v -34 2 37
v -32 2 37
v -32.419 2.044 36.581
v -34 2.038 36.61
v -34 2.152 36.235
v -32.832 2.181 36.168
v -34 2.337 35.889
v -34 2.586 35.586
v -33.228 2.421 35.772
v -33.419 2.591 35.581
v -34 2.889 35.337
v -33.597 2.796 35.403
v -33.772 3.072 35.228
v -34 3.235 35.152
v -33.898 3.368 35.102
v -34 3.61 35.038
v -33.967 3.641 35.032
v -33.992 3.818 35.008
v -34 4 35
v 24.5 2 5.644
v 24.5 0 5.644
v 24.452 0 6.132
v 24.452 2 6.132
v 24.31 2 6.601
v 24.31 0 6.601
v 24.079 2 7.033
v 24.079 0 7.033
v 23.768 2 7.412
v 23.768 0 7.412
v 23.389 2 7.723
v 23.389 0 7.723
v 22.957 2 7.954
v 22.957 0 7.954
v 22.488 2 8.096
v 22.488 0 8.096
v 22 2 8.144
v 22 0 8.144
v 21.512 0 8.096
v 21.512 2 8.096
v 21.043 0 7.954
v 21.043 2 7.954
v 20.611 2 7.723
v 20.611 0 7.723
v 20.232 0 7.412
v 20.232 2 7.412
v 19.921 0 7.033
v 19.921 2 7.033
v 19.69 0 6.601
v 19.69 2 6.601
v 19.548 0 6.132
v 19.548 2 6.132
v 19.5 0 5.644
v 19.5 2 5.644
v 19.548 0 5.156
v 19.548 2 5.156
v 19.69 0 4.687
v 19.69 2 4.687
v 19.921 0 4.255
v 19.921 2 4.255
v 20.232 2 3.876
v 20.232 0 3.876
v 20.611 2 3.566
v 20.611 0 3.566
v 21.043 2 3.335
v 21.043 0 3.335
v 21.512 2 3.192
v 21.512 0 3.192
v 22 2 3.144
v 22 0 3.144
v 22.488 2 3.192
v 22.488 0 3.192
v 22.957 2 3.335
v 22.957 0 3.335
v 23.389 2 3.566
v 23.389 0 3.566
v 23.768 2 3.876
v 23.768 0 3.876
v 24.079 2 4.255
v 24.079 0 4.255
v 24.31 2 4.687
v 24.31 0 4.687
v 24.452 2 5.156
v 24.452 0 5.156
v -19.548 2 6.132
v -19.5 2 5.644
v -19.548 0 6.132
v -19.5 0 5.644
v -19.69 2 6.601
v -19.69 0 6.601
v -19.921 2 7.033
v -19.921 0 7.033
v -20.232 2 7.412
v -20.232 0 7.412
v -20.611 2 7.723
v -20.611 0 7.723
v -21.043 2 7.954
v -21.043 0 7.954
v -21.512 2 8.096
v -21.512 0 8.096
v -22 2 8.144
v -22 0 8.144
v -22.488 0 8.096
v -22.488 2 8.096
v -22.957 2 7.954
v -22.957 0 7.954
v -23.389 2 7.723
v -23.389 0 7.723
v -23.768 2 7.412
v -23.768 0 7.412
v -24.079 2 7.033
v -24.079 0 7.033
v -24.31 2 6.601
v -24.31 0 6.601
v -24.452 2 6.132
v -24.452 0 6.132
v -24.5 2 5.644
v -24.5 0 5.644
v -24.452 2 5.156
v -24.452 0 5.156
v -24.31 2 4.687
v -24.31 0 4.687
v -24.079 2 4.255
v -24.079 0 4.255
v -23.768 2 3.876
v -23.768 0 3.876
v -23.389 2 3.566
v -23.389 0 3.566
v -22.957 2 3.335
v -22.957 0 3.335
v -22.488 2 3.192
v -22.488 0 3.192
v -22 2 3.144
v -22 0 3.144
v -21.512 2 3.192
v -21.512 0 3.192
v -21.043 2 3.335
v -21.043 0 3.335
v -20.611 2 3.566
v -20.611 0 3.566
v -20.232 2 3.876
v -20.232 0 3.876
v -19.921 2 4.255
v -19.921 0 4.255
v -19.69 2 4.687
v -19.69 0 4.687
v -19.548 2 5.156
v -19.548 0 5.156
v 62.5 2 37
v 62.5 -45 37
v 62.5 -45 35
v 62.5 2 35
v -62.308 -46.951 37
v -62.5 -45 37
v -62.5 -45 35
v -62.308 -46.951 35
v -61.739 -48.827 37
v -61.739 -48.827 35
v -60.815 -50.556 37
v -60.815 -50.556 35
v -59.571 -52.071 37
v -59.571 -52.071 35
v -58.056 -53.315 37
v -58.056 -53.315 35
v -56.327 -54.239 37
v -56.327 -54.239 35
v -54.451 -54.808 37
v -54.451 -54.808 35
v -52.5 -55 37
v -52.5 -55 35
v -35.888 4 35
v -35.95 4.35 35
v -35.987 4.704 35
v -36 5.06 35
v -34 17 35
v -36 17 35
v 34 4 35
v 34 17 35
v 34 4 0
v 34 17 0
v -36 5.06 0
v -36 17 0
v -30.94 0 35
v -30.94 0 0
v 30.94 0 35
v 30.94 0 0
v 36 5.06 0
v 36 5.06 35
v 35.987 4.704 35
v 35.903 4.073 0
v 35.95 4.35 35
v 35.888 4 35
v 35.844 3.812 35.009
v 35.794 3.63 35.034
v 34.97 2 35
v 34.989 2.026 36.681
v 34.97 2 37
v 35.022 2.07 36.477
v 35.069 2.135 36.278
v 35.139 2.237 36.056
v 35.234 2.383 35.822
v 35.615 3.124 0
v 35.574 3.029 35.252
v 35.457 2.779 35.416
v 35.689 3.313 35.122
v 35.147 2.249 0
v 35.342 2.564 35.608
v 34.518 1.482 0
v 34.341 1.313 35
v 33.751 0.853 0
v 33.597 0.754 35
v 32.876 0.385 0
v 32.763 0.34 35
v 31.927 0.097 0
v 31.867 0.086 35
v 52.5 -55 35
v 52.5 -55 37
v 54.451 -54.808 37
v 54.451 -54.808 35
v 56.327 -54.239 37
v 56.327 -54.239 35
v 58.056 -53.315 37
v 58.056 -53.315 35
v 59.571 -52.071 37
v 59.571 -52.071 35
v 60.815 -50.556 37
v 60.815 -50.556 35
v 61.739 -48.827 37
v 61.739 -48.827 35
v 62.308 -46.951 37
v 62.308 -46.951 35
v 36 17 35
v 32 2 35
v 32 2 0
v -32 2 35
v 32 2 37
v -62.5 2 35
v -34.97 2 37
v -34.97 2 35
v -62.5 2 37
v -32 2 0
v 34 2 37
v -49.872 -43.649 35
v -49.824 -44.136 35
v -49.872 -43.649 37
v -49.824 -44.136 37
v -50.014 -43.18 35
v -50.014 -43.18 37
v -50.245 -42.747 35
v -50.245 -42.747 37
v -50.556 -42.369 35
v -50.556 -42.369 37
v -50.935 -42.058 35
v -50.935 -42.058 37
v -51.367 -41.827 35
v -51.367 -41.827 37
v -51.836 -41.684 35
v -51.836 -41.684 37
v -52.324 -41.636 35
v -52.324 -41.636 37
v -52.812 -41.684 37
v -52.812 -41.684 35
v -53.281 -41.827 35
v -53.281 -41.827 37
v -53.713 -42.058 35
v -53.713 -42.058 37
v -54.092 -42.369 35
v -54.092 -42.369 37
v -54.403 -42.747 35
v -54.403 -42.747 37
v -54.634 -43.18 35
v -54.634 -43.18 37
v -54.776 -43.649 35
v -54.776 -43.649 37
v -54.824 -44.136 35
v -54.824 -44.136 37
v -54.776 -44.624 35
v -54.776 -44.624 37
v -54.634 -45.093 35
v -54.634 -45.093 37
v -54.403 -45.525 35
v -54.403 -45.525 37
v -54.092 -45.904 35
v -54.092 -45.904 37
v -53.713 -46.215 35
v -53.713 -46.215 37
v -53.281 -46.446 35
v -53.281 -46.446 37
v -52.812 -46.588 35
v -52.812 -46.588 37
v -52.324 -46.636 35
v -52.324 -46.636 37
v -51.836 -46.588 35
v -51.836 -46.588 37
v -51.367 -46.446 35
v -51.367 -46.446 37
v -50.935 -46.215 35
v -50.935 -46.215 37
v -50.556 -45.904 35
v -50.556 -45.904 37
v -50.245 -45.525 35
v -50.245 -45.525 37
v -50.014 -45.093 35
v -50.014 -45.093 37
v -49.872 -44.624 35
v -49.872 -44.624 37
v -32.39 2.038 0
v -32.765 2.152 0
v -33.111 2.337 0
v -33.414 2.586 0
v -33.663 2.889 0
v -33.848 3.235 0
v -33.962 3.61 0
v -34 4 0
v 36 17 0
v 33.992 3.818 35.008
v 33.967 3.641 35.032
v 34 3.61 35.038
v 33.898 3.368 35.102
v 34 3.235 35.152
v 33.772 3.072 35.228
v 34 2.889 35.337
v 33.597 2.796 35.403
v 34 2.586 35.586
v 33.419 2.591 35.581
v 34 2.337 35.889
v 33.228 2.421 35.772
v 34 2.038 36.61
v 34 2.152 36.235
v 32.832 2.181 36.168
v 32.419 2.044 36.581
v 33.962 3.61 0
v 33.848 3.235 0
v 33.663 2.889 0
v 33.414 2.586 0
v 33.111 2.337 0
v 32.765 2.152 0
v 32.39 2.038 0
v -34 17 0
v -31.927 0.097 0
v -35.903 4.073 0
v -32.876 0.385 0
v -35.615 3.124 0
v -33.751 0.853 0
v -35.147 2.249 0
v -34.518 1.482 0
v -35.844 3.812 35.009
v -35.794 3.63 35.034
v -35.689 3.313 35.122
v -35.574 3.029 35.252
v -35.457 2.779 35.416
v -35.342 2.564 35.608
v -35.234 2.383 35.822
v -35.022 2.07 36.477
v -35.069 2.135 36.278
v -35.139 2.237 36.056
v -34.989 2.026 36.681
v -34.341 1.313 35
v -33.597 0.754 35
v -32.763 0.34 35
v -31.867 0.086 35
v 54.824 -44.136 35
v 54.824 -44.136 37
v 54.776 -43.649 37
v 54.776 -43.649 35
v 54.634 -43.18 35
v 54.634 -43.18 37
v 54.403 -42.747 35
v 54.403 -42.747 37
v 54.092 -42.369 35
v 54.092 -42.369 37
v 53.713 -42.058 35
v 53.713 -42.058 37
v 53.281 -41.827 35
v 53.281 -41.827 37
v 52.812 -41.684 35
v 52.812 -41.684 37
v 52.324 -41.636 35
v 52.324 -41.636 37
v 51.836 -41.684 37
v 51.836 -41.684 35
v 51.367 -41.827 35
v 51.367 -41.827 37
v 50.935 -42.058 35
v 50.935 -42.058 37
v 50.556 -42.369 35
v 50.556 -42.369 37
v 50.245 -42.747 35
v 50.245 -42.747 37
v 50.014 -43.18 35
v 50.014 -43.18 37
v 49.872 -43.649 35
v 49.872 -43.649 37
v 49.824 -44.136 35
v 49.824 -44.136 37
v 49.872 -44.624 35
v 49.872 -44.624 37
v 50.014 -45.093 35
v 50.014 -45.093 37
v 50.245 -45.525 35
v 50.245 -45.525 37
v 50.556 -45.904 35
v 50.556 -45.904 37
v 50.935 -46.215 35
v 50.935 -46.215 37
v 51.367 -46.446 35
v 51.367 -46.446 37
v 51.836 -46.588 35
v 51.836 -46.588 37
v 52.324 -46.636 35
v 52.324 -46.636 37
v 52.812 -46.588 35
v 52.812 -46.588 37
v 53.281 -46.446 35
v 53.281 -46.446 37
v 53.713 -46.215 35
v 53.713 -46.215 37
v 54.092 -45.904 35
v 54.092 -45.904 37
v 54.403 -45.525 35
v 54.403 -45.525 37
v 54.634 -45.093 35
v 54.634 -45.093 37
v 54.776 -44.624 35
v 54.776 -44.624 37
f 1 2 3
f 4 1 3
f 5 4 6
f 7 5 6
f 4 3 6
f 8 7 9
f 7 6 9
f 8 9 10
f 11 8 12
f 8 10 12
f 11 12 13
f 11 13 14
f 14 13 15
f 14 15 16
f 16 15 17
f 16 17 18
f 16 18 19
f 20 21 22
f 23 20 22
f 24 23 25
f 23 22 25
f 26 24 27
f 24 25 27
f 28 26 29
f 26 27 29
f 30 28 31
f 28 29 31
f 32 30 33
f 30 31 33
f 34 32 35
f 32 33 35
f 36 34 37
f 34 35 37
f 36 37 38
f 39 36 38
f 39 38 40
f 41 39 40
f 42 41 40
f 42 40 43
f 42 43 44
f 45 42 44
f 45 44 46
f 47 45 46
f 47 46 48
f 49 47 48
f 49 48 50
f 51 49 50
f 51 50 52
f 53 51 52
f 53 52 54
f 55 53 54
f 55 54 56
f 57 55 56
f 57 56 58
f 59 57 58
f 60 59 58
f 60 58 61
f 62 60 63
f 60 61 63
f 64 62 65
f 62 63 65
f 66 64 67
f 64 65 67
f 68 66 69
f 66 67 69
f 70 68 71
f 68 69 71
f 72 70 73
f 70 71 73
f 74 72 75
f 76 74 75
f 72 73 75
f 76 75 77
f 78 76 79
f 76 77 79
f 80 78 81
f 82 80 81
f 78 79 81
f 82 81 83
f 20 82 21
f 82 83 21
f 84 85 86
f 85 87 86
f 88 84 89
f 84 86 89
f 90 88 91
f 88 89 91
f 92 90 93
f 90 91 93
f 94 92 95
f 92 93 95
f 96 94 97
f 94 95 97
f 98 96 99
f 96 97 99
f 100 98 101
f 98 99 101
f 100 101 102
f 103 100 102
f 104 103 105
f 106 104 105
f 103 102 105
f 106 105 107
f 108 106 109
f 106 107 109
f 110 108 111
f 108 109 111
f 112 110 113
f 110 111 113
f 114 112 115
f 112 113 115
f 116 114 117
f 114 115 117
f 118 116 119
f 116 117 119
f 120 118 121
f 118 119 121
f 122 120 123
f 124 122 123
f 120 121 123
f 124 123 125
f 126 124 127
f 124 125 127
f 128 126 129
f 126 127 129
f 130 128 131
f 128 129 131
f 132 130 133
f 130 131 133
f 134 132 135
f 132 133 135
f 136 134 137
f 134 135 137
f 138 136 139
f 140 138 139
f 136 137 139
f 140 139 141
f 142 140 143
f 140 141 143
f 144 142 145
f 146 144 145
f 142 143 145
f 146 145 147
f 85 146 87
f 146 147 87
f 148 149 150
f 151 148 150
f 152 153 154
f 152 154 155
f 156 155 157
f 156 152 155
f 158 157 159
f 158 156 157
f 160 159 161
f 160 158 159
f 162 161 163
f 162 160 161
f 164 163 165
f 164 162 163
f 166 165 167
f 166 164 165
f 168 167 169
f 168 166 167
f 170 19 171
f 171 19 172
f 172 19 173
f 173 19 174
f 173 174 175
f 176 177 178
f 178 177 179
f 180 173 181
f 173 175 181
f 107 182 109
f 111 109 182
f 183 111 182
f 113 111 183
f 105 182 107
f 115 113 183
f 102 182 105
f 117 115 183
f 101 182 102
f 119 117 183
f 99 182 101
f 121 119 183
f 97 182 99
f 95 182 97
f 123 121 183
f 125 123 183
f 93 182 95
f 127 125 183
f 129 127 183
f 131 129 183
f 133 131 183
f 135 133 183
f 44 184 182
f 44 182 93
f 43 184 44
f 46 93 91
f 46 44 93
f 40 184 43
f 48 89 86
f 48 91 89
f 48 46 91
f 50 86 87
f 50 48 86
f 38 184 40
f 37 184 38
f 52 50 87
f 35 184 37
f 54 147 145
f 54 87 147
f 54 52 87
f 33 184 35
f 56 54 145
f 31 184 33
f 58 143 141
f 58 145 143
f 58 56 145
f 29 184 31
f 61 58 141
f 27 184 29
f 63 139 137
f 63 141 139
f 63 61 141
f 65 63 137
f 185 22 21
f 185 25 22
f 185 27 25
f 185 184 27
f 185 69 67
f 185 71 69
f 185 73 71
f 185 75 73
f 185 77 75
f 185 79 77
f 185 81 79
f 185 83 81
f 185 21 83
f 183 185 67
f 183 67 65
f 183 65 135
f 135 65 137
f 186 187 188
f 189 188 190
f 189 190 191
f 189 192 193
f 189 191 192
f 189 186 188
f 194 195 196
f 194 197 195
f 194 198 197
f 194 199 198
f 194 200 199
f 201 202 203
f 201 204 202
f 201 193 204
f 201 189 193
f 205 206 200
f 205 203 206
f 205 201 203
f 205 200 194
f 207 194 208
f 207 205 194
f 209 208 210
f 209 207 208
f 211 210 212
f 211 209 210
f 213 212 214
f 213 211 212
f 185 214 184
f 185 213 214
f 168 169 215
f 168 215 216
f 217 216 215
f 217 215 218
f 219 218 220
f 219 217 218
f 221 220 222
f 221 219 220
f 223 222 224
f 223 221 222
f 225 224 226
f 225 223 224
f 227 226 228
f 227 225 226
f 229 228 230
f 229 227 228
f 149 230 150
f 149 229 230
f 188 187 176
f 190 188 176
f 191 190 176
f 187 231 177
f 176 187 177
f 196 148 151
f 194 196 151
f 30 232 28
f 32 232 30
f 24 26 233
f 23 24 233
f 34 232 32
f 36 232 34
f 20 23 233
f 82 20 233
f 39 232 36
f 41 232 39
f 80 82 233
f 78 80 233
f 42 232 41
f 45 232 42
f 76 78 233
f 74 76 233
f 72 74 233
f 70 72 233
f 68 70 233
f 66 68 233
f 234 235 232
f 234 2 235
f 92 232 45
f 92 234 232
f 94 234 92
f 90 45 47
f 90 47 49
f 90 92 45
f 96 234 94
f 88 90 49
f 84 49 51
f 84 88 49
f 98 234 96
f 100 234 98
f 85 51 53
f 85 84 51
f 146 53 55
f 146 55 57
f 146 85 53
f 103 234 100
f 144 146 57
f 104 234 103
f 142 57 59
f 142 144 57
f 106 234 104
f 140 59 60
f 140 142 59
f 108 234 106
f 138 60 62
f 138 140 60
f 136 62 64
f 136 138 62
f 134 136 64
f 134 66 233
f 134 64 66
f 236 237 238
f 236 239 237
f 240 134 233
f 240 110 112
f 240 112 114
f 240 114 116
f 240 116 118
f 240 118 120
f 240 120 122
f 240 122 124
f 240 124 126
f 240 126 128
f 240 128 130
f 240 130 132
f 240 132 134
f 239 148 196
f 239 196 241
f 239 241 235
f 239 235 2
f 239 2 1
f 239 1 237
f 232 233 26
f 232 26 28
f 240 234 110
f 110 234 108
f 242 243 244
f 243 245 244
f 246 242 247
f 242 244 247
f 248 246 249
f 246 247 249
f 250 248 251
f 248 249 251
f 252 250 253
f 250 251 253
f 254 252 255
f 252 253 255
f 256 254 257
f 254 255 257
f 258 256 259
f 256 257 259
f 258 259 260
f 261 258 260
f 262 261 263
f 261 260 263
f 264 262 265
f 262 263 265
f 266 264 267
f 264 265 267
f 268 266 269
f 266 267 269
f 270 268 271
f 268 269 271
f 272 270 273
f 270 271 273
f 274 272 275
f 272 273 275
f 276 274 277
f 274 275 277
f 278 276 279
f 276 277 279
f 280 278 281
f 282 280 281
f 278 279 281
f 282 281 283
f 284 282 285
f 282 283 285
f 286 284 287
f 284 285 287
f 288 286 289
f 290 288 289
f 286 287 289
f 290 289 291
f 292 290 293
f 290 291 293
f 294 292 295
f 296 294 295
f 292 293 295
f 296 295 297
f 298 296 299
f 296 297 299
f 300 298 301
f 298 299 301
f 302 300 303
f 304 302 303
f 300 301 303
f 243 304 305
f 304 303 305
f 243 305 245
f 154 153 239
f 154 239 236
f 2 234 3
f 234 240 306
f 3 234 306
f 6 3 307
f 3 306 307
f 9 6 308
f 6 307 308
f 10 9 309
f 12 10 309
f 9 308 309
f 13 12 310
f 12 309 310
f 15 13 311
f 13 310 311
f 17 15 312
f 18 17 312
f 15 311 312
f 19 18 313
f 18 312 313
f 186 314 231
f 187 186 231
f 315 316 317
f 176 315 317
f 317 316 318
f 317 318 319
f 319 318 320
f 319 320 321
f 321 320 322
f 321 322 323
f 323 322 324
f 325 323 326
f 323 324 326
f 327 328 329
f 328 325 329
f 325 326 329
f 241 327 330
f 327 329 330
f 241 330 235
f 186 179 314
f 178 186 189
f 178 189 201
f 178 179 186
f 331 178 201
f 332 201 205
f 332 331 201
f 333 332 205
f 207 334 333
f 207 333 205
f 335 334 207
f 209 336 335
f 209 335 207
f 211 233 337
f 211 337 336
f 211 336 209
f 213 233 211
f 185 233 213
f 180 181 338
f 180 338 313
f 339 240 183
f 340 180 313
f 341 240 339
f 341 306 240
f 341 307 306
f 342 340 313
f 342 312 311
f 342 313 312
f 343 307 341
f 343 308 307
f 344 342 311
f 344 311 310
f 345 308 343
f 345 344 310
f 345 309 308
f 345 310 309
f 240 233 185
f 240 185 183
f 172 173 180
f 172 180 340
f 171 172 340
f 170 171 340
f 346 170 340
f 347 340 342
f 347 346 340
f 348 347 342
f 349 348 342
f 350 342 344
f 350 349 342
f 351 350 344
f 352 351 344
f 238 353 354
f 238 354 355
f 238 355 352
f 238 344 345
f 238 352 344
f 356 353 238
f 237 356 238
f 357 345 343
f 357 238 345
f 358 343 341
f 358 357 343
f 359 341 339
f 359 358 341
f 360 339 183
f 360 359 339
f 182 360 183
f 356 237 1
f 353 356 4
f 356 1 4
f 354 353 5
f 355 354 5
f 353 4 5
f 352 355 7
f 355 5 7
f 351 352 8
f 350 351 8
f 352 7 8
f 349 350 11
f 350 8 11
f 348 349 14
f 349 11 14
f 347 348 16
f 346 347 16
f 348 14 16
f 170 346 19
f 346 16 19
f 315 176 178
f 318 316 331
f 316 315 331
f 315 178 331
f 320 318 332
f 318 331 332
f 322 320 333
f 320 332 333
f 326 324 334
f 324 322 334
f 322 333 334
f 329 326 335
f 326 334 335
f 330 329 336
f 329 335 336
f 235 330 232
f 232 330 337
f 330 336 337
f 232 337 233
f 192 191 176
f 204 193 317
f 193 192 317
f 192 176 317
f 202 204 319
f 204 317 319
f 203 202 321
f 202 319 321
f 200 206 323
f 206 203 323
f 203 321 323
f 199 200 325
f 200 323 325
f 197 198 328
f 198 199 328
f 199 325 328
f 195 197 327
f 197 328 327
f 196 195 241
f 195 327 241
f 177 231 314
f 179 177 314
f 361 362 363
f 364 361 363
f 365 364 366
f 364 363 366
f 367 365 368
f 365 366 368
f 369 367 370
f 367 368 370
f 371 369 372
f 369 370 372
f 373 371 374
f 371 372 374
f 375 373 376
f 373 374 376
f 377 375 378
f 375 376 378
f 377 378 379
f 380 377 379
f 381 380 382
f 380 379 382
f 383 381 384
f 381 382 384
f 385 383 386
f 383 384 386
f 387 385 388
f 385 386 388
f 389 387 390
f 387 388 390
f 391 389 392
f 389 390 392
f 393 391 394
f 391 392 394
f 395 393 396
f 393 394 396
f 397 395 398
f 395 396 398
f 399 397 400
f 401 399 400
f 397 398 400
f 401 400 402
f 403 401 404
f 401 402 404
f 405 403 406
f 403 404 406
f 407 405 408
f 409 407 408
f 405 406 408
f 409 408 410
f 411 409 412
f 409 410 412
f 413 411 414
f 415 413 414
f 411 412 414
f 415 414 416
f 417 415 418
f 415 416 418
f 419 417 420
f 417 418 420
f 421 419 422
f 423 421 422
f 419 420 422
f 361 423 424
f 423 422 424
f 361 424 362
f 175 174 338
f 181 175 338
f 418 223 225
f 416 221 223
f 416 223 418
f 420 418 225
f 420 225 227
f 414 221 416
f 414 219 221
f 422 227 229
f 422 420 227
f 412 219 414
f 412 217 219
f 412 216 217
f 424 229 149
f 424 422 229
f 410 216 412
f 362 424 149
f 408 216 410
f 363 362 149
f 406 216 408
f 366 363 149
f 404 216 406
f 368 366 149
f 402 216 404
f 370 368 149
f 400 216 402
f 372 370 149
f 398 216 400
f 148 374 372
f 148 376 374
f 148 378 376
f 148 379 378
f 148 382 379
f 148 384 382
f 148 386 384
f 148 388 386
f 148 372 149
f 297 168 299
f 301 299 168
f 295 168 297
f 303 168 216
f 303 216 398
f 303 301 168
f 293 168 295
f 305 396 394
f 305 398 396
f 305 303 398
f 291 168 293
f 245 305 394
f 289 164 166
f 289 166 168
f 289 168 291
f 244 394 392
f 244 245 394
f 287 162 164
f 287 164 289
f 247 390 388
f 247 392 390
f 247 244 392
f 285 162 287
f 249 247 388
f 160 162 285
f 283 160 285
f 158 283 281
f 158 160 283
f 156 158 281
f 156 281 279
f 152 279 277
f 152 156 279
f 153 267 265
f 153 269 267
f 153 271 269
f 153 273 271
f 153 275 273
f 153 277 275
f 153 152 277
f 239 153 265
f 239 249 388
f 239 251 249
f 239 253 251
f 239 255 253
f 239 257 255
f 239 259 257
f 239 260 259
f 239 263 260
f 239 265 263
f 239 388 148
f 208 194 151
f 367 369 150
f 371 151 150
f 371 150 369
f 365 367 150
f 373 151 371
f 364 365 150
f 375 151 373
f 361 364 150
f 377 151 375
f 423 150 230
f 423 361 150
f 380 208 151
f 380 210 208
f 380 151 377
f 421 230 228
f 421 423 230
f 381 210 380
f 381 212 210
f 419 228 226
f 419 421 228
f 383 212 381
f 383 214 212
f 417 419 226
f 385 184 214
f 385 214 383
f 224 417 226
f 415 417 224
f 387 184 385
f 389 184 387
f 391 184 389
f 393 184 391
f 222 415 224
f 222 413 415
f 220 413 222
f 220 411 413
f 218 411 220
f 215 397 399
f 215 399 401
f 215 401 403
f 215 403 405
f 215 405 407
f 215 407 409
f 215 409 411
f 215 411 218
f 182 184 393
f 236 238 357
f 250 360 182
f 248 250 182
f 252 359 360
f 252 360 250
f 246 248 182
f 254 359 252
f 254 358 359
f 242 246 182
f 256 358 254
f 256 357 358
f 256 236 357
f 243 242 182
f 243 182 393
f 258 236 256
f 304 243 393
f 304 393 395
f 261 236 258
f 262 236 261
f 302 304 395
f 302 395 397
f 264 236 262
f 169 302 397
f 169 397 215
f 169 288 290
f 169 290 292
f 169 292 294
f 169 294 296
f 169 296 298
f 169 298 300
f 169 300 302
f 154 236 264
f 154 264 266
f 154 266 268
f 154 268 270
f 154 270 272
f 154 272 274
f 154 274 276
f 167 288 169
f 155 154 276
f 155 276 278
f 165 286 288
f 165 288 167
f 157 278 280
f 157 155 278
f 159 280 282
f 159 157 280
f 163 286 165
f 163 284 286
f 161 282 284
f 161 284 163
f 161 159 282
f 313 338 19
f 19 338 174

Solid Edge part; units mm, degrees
sketch "Sketch1" plane through (0, 0, 0) normal (1, 0, 0) x (0, 1, 0)
  line L0 (0, 0) -> (0, 35)
  line L1 (0, 35) -> (2, 35)
  line L2 (2, 35) -> (2, 0)
  line L3 (2, 0) -> (0, 0)
extrude "Protrusion1" add sketch "Sketch1" along normal mid plane 68
sketch "Sketch2" plane through (0, 0, 0) normal (1, 0, 0) x (0, 1, 0)
  line L0 (-55, 37) -> (0, 37)
  line L1 (2, 37) -> (0, 37)
  line L2 (2, 37) -> (2, 35)
  line L3 (0, 35) -> (2, 35)
  line L4 (0, 35) -> (-55, 35)
  line L5 (-55, 35) -> (-55, 37)
extrude "ExtrudedProtrusion_2" add sketch "Sketch2" along normal mid plane 125
sketch "Sketch3" plane through (0, -26.5, 37) normal (0, 0, 1) x (1, 0, 0)
  circle A0 centre (-52.3239, -17.6363) radius 2.5
  circle A1 centre (52.3239, -17.6363) radius 2.5
extrude "ExtrudedCutout_1" cut sketch "Sketch3" against normal blind 8.7921
sketch "Sketch4" plane through (0, 0, 17.5) normal (0, -1, 0) x (1, 0, 0)
  circle A0 centre (-22, -11.8558) radius 2.5
  circle A1 centre (22, -11.8558) radius 2.5
extrude "ExtrudedCutout_2" cut sketch "Sketch4" against normal blind 47.6347
sketch "Sketch5" plane through (0, 2, 18.5) normal (0, 1, 0) x (-1, 0, 0)
  line L0 (-36, -18.5) -> (-36, 16.5)
  line L1 (-36, 16.5) -> (-34, 16.5)
  line L2 (-34, 16.5) -> (-34, -18.5)
  line L3 (-34, -18.5) -> (-36, -18.5)
  line L4 (36, 16.5) -> (36, -18.5)
  line L5 (36, -18.5) -> (34, -18.5)
  line L6 (34, -18.5) -> (34, 16.5)
  line L7 (34, 16.5) -> (36, 16.5)
extrude "ExtrudedProtrusion_3" add sketch "Sketch5" against normal up to vertex (2 mm away) and the other way blind 15
fillet "Round_1" radius 5.06 2 edges at (36, 0, 17.5) (-36, 0, 17.5)
fillet "Round_2" radius 2 1 edges at (34, 2, 17.5)
fillet "Round_3" radius 2 1 edges at (-34, 2, 17.5)
fillet "Round_5" radius 2 2 edges at (33.4849, 2, 35) (-33.4849, 2, 35)
fillet "Round_6" radius 10 2 edges at (-62.5, -55, 36) (62.5, -55, 36)
